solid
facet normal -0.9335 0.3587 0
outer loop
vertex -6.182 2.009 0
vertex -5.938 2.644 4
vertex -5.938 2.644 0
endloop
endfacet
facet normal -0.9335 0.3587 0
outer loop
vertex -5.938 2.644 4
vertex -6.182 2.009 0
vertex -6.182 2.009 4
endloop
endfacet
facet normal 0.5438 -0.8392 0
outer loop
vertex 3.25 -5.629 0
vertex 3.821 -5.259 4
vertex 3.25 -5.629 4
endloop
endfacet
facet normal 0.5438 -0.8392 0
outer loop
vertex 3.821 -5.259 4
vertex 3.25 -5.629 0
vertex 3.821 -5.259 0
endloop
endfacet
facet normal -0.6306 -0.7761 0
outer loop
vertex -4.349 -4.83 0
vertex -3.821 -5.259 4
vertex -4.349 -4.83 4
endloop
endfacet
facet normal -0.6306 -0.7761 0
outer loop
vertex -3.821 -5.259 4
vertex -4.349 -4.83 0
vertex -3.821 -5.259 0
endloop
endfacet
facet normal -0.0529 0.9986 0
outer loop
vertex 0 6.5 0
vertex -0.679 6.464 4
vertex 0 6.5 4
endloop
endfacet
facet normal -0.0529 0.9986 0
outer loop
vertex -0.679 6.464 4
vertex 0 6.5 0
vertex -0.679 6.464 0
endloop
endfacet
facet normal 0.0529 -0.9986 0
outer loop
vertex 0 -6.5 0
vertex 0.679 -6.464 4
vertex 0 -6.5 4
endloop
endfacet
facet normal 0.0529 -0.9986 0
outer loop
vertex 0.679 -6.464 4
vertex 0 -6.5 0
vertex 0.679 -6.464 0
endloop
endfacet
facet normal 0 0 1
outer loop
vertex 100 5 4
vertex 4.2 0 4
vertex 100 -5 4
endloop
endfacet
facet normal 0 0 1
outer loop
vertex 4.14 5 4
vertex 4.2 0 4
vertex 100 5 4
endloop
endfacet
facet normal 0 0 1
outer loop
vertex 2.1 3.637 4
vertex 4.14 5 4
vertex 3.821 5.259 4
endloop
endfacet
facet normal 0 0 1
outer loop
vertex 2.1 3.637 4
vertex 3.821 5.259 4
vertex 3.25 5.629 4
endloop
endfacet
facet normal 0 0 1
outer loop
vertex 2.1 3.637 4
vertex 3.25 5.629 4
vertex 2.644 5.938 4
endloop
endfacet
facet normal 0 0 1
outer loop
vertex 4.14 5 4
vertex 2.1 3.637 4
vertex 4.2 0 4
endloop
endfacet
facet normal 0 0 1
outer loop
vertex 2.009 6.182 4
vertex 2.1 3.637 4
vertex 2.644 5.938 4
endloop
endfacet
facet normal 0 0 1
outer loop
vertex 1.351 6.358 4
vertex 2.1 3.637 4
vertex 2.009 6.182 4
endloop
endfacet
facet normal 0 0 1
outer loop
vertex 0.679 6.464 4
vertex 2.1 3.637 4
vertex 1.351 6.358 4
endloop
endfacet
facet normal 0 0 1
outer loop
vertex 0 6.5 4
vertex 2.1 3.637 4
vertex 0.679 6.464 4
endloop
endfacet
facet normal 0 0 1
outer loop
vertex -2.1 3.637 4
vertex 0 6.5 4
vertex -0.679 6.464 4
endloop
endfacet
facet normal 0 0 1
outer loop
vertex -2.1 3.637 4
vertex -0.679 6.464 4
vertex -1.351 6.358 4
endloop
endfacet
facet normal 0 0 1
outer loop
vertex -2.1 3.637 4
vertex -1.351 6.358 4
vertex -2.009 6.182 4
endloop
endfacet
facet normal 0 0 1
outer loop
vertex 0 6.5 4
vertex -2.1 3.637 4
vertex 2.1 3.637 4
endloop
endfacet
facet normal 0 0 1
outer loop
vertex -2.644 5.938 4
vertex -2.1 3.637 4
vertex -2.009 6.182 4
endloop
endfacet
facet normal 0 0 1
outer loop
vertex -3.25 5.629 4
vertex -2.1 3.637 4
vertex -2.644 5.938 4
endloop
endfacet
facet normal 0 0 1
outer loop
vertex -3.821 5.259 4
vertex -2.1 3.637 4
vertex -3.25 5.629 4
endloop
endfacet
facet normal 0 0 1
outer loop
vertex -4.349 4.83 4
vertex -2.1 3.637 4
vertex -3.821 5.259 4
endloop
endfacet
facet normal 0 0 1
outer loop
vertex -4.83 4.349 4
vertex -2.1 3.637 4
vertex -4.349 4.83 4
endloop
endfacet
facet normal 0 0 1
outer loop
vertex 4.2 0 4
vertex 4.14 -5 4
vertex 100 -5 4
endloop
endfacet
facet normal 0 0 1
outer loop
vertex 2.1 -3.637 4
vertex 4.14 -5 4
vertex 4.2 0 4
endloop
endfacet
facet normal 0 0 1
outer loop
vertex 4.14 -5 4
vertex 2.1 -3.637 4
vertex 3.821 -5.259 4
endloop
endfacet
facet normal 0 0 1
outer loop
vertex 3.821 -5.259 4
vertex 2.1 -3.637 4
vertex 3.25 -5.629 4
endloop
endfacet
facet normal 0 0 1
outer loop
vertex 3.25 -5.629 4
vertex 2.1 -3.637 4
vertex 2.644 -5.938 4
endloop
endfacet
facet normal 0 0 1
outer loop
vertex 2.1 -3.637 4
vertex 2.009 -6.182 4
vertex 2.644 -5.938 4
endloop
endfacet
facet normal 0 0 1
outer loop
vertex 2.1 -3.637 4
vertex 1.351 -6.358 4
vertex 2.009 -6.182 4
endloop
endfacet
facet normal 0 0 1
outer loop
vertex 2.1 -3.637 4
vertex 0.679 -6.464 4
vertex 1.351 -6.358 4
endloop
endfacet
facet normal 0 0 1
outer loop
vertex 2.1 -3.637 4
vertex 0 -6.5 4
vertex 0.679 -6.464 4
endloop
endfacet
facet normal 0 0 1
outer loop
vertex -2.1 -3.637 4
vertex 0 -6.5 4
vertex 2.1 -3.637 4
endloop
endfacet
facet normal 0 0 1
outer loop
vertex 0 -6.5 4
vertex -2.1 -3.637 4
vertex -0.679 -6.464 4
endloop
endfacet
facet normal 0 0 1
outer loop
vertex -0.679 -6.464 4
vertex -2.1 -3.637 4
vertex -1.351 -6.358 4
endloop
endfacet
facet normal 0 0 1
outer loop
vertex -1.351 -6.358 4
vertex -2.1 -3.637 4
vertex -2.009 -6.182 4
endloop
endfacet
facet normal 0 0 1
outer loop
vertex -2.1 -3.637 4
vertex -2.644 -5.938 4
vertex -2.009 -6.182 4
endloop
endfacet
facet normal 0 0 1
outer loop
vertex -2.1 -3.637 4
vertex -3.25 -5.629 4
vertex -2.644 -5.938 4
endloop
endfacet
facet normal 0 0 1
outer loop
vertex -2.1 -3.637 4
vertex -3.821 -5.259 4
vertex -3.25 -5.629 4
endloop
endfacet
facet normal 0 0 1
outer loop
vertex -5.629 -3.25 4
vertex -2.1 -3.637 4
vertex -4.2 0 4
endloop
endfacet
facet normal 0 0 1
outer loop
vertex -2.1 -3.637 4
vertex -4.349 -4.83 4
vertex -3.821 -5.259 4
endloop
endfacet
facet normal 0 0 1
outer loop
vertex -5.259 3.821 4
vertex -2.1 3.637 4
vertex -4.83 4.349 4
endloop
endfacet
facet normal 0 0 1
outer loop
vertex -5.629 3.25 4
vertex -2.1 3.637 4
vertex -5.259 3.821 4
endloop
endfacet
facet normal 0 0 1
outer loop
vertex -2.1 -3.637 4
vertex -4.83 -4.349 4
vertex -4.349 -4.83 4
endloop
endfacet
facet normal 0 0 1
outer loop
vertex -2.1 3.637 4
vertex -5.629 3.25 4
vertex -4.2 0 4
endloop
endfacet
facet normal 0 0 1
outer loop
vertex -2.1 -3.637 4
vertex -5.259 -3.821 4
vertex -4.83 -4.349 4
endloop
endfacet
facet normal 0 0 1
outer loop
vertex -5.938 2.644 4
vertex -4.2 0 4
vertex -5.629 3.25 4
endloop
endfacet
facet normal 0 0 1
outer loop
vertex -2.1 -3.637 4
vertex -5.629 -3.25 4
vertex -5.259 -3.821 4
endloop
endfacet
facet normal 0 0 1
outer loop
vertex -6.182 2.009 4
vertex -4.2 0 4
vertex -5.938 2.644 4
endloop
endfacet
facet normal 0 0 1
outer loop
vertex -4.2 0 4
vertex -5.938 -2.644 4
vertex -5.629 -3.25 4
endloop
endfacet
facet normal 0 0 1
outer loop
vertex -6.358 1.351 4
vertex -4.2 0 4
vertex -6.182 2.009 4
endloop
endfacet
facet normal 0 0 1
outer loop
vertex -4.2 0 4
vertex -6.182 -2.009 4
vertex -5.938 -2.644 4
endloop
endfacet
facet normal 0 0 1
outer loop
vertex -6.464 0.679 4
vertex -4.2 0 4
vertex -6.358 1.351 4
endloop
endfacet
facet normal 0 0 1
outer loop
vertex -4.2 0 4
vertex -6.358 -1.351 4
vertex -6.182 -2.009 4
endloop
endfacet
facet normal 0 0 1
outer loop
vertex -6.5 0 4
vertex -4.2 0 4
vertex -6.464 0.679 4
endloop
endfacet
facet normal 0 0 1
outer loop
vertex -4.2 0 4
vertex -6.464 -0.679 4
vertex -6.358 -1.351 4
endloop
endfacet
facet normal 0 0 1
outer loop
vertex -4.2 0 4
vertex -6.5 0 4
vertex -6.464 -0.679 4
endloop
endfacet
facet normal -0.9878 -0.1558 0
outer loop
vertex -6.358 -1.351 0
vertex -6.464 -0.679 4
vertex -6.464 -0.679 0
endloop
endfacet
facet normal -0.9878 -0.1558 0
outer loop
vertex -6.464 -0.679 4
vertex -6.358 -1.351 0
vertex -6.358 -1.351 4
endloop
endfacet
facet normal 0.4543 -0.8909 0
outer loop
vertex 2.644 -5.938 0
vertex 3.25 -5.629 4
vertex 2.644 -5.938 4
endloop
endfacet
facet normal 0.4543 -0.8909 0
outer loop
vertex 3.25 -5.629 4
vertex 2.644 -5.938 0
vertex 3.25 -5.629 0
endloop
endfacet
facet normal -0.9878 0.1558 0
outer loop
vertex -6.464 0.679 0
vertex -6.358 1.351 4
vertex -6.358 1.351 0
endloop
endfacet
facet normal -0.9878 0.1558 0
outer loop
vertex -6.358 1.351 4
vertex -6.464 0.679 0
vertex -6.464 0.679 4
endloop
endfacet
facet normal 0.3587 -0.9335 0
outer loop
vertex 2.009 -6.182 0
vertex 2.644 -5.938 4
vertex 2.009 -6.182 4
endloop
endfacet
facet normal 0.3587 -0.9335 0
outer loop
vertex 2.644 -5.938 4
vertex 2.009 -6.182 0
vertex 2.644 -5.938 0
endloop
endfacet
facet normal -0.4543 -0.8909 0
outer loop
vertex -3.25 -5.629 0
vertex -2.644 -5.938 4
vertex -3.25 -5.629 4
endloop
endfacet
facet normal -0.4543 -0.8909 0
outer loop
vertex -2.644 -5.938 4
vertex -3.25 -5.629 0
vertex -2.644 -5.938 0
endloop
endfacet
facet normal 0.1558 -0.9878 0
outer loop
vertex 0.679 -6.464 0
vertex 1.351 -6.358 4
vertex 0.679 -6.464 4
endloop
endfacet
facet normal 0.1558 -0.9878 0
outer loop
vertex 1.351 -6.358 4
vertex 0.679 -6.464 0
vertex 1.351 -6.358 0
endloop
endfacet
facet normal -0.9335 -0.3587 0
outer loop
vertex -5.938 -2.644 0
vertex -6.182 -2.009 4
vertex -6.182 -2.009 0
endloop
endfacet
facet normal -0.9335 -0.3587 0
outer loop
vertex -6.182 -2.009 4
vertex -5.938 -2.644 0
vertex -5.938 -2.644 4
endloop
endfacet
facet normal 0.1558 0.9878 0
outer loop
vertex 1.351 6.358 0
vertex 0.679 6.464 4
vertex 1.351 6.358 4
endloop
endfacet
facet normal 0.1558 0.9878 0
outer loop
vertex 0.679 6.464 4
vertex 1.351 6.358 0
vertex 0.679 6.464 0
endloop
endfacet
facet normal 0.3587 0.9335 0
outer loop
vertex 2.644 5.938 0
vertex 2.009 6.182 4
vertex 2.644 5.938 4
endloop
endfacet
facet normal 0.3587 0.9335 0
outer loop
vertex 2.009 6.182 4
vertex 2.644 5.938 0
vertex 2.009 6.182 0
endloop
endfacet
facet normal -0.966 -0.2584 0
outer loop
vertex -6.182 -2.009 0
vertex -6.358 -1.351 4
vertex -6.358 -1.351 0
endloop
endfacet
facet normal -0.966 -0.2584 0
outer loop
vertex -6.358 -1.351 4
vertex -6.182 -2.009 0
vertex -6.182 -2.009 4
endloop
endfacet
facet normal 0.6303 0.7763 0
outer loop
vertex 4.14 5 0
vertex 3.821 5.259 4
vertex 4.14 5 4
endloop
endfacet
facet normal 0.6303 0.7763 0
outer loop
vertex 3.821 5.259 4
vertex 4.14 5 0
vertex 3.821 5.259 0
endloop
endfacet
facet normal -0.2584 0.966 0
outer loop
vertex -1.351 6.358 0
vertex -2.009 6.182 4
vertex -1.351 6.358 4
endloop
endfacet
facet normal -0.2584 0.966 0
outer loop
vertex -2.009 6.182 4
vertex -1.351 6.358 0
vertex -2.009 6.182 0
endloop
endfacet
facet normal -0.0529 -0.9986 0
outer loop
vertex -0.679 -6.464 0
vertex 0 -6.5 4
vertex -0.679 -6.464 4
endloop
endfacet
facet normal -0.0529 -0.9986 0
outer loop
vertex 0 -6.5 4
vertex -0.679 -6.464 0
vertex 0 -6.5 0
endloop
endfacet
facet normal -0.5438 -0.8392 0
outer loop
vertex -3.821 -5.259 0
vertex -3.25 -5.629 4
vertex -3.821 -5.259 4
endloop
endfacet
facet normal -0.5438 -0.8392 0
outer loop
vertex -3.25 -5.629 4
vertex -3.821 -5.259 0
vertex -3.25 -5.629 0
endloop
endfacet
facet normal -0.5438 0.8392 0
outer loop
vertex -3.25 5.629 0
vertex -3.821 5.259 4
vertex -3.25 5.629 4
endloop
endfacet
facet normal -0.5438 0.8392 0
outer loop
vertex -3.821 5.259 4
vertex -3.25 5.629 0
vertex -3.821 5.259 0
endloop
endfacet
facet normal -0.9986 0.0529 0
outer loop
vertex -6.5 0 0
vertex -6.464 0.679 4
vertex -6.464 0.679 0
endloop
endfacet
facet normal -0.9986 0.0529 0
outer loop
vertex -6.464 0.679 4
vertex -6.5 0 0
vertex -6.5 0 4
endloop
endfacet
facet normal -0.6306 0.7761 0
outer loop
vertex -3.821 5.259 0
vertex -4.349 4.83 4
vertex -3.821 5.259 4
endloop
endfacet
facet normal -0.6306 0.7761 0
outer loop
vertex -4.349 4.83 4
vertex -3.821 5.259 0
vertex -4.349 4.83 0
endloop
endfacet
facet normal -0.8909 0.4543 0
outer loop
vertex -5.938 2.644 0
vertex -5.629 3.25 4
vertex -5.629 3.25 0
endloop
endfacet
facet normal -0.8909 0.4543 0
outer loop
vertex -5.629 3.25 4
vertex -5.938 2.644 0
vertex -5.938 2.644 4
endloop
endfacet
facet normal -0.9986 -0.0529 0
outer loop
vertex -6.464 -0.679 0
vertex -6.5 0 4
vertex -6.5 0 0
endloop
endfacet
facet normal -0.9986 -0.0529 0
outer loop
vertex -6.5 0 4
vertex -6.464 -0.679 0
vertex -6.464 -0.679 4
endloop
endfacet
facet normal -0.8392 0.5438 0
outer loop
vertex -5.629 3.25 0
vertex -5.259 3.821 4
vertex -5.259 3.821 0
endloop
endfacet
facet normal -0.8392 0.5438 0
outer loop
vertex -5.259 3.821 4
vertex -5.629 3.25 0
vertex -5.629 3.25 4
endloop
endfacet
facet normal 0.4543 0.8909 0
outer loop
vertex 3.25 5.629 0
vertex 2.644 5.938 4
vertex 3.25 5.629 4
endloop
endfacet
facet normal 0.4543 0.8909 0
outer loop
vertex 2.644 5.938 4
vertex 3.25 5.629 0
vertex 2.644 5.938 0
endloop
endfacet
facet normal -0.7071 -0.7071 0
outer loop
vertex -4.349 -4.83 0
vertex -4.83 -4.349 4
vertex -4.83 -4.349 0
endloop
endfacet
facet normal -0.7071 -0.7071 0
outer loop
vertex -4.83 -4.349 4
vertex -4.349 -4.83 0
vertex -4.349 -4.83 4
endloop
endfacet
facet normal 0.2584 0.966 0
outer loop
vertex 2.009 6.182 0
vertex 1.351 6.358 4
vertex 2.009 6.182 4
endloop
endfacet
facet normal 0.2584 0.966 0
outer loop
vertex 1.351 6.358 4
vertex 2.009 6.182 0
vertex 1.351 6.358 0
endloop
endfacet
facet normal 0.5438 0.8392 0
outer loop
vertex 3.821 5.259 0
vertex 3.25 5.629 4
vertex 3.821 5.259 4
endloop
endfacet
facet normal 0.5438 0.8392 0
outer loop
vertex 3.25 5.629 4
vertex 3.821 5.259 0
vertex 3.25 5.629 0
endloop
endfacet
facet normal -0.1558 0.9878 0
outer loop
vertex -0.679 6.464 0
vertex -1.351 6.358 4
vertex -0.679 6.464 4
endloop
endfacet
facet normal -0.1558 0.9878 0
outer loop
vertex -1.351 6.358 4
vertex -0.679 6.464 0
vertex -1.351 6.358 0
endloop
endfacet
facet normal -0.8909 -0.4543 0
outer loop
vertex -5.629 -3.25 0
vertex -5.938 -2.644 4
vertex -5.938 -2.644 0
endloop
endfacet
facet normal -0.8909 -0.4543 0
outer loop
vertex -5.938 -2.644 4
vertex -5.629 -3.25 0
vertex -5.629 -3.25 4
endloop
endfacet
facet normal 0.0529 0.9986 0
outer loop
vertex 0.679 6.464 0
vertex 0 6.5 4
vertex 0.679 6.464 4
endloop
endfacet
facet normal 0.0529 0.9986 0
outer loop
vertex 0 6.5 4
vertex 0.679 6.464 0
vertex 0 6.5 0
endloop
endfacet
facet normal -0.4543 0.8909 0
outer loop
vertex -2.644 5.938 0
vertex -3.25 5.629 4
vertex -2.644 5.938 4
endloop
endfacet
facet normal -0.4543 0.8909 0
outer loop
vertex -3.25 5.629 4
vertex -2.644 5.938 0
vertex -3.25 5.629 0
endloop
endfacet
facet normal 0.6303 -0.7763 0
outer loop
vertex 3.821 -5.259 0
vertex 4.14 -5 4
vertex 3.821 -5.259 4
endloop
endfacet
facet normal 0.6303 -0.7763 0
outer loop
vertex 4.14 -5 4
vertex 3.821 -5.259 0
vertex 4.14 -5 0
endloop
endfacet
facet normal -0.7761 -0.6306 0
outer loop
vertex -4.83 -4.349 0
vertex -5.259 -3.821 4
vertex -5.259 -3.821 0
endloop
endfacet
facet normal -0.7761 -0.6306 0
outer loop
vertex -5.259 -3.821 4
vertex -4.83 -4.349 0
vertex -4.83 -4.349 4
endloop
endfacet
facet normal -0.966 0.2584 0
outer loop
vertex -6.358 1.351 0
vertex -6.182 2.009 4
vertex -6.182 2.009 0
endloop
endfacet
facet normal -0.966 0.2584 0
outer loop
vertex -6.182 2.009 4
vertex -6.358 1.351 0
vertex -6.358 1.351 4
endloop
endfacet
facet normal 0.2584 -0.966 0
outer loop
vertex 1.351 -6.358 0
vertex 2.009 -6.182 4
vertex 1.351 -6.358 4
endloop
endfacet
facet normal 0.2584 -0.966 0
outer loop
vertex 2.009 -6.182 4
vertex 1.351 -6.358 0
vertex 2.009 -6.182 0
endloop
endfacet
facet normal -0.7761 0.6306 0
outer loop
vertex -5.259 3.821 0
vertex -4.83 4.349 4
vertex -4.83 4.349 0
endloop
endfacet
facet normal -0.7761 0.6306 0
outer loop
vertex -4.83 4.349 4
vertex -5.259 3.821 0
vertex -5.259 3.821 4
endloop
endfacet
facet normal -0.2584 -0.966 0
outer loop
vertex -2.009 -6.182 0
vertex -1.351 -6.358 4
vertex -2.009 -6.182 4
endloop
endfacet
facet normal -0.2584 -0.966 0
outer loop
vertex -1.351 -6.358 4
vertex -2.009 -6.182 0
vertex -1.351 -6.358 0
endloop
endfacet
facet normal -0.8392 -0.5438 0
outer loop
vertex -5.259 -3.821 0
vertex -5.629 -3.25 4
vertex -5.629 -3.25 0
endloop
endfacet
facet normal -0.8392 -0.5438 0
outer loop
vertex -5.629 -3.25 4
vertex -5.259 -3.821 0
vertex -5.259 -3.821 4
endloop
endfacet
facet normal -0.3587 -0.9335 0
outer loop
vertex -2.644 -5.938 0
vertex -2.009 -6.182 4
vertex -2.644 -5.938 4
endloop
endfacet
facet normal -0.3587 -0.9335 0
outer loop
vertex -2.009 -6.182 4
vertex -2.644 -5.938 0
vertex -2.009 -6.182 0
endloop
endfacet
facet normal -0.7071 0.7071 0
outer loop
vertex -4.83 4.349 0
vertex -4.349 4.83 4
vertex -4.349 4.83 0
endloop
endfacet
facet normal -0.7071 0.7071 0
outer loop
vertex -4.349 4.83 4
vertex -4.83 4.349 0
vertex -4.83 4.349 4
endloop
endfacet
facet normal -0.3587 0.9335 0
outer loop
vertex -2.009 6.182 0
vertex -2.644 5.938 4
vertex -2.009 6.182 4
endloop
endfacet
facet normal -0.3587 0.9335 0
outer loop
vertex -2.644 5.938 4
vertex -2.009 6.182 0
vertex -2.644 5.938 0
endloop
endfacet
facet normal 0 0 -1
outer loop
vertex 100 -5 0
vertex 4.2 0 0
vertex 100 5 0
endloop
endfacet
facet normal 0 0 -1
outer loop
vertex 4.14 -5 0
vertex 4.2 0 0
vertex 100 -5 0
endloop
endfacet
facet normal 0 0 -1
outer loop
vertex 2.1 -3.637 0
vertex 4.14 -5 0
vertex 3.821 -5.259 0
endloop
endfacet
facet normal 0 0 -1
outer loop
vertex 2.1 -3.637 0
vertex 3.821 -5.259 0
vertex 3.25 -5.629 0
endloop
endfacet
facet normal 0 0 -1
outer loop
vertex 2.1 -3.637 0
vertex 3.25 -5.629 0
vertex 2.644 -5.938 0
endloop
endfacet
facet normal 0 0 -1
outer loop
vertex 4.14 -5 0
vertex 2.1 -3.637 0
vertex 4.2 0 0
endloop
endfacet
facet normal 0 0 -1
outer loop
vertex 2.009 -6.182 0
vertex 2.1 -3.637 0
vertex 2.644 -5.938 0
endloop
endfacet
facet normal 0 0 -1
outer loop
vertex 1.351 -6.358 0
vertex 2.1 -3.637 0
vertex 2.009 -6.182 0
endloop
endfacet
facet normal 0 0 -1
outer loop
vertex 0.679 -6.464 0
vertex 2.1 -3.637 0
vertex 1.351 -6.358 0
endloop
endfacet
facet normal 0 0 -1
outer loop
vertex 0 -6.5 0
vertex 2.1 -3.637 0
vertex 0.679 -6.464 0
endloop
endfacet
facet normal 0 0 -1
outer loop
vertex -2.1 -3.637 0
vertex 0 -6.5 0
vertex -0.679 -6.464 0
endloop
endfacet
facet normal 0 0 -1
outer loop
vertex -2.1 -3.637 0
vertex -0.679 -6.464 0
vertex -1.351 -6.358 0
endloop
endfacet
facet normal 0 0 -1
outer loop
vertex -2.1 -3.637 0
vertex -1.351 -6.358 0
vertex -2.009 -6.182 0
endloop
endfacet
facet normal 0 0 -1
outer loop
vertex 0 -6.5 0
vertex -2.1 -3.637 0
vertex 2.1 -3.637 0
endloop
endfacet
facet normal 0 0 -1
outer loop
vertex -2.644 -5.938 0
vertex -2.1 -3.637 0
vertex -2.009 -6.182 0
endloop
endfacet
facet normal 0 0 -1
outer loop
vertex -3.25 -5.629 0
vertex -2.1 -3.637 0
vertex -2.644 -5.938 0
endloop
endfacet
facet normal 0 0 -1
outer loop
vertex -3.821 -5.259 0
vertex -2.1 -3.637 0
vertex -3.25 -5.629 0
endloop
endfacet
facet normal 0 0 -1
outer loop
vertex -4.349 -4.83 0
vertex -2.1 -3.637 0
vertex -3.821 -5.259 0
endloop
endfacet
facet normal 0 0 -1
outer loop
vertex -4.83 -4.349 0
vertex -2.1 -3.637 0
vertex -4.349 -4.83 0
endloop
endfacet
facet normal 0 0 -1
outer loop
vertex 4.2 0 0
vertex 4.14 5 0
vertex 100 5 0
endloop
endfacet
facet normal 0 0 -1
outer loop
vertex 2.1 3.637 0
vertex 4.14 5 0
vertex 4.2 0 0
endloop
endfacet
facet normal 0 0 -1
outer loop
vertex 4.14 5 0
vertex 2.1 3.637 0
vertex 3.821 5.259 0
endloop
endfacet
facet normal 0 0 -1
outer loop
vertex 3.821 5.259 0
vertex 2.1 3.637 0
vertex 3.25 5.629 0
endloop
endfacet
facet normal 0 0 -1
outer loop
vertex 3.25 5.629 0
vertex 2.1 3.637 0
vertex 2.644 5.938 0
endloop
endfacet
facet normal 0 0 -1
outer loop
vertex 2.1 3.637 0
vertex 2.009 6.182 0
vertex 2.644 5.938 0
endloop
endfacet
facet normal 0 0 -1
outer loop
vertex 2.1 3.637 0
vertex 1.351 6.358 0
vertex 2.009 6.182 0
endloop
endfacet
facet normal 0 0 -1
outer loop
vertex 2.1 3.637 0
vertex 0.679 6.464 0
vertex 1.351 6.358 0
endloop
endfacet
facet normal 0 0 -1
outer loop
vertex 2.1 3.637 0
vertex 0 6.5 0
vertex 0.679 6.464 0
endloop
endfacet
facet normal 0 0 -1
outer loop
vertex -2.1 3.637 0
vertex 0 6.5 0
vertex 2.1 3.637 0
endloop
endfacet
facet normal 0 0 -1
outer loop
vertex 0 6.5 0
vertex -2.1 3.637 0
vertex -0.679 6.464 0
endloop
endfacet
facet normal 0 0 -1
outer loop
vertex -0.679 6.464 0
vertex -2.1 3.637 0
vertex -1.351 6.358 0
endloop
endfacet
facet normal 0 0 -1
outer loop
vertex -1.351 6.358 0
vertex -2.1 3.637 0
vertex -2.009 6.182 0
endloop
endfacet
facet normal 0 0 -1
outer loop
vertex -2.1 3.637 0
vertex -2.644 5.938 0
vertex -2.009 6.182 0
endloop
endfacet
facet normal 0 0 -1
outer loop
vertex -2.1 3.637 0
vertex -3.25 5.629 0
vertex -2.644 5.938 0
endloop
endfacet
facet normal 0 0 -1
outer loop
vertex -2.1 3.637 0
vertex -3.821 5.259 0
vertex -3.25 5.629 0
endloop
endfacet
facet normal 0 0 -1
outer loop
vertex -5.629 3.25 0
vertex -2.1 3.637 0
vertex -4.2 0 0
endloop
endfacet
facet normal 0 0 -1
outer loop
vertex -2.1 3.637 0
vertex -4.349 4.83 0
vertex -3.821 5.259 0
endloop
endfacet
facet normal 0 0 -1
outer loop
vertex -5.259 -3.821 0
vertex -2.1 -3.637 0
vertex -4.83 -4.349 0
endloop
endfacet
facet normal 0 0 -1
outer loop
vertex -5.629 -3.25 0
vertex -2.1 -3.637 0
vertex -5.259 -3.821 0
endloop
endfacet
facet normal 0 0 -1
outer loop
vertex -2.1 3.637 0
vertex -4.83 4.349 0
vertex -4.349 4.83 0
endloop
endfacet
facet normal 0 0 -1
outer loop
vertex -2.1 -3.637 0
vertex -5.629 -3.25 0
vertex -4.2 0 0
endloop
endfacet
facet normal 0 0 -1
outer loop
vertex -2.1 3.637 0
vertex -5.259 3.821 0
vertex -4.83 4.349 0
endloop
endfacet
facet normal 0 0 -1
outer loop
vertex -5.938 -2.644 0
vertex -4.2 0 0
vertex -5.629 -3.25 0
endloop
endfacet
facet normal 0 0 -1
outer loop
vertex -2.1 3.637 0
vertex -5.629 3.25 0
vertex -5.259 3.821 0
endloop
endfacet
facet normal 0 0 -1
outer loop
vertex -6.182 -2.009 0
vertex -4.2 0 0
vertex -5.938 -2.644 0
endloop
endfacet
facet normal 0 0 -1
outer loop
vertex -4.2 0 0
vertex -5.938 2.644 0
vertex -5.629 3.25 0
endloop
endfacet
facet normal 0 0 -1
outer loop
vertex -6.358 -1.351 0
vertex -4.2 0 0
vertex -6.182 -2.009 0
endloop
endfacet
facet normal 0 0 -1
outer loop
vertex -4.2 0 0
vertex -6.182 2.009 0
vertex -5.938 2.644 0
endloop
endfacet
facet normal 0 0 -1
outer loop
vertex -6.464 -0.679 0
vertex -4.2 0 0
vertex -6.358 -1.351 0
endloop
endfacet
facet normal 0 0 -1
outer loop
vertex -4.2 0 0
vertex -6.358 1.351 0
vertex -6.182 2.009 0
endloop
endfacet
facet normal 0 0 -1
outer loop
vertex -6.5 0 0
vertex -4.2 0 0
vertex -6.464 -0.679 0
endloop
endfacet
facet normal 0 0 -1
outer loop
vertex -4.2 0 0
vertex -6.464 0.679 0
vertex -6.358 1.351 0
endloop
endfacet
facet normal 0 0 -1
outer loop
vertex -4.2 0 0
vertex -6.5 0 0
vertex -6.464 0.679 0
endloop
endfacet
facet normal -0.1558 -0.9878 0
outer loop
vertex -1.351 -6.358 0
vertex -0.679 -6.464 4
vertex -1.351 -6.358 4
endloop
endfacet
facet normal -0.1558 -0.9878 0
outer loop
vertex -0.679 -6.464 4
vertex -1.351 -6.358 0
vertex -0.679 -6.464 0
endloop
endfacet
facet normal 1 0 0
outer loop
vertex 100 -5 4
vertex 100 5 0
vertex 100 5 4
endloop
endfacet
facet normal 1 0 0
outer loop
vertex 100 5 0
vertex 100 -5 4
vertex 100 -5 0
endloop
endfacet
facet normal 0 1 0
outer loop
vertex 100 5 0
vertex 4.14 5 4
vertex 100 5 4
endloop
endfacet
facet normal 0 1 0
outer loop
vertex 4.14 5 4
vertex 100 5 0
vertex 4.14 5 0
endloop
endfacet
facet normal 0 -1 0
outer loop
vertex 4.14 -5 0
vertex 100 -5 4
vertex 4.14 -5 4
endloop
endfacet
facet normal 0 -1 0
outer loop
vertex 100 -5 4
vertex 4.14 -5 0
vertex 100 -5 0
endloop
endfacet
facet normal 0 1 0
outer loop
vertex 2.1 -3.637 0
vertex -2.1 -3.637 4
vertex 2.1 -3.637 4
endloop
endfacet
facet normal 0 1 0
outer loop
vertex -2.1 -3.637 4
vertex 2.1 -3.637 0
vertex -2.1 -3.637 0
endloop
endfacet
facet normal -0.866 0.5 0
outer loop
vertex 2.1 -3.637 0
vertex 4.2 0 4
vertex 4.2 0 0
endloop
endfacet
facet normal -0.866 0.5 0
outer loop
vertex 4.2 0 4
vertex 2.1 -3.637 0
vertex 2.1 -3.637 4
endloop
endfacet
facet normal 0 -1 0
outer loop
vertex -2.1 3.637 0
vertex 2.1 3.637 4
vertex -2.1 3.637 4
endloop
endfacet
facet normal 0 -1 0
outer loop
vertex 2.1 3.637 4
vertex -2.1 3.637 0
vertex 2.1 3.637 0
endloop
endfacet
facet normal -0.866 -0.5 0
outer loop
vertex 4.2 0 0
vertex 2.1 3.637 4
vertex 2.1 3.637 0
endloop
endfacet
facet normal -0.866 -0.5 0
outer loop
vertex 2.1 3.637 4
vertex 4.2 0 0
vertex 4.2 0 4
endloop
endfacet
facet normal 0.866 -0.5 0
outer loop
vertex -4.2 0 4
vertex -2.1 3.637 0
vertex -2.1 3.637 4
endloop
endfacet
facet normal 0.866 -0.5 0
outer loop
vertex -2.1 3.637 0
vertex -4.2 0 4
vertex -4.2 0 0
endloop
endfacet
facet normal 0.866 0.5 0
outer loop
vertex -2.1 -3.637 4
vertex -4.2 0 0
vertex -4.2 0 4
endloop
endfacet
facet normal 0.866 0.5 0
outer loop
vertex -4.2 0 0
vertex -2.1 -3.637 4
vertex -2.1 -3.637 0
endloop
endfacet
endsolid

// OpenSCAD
//M4-Ringschlüssel
$fn=60;

difference() {
    union() {
        cylinder(d=13, h=4);
        translate([0, -5, 0]) cube([100, 10, 4]);
    }
    translate([0, 0, -1]) cylinder(d=8.4, h=6, $fn=6);
}
